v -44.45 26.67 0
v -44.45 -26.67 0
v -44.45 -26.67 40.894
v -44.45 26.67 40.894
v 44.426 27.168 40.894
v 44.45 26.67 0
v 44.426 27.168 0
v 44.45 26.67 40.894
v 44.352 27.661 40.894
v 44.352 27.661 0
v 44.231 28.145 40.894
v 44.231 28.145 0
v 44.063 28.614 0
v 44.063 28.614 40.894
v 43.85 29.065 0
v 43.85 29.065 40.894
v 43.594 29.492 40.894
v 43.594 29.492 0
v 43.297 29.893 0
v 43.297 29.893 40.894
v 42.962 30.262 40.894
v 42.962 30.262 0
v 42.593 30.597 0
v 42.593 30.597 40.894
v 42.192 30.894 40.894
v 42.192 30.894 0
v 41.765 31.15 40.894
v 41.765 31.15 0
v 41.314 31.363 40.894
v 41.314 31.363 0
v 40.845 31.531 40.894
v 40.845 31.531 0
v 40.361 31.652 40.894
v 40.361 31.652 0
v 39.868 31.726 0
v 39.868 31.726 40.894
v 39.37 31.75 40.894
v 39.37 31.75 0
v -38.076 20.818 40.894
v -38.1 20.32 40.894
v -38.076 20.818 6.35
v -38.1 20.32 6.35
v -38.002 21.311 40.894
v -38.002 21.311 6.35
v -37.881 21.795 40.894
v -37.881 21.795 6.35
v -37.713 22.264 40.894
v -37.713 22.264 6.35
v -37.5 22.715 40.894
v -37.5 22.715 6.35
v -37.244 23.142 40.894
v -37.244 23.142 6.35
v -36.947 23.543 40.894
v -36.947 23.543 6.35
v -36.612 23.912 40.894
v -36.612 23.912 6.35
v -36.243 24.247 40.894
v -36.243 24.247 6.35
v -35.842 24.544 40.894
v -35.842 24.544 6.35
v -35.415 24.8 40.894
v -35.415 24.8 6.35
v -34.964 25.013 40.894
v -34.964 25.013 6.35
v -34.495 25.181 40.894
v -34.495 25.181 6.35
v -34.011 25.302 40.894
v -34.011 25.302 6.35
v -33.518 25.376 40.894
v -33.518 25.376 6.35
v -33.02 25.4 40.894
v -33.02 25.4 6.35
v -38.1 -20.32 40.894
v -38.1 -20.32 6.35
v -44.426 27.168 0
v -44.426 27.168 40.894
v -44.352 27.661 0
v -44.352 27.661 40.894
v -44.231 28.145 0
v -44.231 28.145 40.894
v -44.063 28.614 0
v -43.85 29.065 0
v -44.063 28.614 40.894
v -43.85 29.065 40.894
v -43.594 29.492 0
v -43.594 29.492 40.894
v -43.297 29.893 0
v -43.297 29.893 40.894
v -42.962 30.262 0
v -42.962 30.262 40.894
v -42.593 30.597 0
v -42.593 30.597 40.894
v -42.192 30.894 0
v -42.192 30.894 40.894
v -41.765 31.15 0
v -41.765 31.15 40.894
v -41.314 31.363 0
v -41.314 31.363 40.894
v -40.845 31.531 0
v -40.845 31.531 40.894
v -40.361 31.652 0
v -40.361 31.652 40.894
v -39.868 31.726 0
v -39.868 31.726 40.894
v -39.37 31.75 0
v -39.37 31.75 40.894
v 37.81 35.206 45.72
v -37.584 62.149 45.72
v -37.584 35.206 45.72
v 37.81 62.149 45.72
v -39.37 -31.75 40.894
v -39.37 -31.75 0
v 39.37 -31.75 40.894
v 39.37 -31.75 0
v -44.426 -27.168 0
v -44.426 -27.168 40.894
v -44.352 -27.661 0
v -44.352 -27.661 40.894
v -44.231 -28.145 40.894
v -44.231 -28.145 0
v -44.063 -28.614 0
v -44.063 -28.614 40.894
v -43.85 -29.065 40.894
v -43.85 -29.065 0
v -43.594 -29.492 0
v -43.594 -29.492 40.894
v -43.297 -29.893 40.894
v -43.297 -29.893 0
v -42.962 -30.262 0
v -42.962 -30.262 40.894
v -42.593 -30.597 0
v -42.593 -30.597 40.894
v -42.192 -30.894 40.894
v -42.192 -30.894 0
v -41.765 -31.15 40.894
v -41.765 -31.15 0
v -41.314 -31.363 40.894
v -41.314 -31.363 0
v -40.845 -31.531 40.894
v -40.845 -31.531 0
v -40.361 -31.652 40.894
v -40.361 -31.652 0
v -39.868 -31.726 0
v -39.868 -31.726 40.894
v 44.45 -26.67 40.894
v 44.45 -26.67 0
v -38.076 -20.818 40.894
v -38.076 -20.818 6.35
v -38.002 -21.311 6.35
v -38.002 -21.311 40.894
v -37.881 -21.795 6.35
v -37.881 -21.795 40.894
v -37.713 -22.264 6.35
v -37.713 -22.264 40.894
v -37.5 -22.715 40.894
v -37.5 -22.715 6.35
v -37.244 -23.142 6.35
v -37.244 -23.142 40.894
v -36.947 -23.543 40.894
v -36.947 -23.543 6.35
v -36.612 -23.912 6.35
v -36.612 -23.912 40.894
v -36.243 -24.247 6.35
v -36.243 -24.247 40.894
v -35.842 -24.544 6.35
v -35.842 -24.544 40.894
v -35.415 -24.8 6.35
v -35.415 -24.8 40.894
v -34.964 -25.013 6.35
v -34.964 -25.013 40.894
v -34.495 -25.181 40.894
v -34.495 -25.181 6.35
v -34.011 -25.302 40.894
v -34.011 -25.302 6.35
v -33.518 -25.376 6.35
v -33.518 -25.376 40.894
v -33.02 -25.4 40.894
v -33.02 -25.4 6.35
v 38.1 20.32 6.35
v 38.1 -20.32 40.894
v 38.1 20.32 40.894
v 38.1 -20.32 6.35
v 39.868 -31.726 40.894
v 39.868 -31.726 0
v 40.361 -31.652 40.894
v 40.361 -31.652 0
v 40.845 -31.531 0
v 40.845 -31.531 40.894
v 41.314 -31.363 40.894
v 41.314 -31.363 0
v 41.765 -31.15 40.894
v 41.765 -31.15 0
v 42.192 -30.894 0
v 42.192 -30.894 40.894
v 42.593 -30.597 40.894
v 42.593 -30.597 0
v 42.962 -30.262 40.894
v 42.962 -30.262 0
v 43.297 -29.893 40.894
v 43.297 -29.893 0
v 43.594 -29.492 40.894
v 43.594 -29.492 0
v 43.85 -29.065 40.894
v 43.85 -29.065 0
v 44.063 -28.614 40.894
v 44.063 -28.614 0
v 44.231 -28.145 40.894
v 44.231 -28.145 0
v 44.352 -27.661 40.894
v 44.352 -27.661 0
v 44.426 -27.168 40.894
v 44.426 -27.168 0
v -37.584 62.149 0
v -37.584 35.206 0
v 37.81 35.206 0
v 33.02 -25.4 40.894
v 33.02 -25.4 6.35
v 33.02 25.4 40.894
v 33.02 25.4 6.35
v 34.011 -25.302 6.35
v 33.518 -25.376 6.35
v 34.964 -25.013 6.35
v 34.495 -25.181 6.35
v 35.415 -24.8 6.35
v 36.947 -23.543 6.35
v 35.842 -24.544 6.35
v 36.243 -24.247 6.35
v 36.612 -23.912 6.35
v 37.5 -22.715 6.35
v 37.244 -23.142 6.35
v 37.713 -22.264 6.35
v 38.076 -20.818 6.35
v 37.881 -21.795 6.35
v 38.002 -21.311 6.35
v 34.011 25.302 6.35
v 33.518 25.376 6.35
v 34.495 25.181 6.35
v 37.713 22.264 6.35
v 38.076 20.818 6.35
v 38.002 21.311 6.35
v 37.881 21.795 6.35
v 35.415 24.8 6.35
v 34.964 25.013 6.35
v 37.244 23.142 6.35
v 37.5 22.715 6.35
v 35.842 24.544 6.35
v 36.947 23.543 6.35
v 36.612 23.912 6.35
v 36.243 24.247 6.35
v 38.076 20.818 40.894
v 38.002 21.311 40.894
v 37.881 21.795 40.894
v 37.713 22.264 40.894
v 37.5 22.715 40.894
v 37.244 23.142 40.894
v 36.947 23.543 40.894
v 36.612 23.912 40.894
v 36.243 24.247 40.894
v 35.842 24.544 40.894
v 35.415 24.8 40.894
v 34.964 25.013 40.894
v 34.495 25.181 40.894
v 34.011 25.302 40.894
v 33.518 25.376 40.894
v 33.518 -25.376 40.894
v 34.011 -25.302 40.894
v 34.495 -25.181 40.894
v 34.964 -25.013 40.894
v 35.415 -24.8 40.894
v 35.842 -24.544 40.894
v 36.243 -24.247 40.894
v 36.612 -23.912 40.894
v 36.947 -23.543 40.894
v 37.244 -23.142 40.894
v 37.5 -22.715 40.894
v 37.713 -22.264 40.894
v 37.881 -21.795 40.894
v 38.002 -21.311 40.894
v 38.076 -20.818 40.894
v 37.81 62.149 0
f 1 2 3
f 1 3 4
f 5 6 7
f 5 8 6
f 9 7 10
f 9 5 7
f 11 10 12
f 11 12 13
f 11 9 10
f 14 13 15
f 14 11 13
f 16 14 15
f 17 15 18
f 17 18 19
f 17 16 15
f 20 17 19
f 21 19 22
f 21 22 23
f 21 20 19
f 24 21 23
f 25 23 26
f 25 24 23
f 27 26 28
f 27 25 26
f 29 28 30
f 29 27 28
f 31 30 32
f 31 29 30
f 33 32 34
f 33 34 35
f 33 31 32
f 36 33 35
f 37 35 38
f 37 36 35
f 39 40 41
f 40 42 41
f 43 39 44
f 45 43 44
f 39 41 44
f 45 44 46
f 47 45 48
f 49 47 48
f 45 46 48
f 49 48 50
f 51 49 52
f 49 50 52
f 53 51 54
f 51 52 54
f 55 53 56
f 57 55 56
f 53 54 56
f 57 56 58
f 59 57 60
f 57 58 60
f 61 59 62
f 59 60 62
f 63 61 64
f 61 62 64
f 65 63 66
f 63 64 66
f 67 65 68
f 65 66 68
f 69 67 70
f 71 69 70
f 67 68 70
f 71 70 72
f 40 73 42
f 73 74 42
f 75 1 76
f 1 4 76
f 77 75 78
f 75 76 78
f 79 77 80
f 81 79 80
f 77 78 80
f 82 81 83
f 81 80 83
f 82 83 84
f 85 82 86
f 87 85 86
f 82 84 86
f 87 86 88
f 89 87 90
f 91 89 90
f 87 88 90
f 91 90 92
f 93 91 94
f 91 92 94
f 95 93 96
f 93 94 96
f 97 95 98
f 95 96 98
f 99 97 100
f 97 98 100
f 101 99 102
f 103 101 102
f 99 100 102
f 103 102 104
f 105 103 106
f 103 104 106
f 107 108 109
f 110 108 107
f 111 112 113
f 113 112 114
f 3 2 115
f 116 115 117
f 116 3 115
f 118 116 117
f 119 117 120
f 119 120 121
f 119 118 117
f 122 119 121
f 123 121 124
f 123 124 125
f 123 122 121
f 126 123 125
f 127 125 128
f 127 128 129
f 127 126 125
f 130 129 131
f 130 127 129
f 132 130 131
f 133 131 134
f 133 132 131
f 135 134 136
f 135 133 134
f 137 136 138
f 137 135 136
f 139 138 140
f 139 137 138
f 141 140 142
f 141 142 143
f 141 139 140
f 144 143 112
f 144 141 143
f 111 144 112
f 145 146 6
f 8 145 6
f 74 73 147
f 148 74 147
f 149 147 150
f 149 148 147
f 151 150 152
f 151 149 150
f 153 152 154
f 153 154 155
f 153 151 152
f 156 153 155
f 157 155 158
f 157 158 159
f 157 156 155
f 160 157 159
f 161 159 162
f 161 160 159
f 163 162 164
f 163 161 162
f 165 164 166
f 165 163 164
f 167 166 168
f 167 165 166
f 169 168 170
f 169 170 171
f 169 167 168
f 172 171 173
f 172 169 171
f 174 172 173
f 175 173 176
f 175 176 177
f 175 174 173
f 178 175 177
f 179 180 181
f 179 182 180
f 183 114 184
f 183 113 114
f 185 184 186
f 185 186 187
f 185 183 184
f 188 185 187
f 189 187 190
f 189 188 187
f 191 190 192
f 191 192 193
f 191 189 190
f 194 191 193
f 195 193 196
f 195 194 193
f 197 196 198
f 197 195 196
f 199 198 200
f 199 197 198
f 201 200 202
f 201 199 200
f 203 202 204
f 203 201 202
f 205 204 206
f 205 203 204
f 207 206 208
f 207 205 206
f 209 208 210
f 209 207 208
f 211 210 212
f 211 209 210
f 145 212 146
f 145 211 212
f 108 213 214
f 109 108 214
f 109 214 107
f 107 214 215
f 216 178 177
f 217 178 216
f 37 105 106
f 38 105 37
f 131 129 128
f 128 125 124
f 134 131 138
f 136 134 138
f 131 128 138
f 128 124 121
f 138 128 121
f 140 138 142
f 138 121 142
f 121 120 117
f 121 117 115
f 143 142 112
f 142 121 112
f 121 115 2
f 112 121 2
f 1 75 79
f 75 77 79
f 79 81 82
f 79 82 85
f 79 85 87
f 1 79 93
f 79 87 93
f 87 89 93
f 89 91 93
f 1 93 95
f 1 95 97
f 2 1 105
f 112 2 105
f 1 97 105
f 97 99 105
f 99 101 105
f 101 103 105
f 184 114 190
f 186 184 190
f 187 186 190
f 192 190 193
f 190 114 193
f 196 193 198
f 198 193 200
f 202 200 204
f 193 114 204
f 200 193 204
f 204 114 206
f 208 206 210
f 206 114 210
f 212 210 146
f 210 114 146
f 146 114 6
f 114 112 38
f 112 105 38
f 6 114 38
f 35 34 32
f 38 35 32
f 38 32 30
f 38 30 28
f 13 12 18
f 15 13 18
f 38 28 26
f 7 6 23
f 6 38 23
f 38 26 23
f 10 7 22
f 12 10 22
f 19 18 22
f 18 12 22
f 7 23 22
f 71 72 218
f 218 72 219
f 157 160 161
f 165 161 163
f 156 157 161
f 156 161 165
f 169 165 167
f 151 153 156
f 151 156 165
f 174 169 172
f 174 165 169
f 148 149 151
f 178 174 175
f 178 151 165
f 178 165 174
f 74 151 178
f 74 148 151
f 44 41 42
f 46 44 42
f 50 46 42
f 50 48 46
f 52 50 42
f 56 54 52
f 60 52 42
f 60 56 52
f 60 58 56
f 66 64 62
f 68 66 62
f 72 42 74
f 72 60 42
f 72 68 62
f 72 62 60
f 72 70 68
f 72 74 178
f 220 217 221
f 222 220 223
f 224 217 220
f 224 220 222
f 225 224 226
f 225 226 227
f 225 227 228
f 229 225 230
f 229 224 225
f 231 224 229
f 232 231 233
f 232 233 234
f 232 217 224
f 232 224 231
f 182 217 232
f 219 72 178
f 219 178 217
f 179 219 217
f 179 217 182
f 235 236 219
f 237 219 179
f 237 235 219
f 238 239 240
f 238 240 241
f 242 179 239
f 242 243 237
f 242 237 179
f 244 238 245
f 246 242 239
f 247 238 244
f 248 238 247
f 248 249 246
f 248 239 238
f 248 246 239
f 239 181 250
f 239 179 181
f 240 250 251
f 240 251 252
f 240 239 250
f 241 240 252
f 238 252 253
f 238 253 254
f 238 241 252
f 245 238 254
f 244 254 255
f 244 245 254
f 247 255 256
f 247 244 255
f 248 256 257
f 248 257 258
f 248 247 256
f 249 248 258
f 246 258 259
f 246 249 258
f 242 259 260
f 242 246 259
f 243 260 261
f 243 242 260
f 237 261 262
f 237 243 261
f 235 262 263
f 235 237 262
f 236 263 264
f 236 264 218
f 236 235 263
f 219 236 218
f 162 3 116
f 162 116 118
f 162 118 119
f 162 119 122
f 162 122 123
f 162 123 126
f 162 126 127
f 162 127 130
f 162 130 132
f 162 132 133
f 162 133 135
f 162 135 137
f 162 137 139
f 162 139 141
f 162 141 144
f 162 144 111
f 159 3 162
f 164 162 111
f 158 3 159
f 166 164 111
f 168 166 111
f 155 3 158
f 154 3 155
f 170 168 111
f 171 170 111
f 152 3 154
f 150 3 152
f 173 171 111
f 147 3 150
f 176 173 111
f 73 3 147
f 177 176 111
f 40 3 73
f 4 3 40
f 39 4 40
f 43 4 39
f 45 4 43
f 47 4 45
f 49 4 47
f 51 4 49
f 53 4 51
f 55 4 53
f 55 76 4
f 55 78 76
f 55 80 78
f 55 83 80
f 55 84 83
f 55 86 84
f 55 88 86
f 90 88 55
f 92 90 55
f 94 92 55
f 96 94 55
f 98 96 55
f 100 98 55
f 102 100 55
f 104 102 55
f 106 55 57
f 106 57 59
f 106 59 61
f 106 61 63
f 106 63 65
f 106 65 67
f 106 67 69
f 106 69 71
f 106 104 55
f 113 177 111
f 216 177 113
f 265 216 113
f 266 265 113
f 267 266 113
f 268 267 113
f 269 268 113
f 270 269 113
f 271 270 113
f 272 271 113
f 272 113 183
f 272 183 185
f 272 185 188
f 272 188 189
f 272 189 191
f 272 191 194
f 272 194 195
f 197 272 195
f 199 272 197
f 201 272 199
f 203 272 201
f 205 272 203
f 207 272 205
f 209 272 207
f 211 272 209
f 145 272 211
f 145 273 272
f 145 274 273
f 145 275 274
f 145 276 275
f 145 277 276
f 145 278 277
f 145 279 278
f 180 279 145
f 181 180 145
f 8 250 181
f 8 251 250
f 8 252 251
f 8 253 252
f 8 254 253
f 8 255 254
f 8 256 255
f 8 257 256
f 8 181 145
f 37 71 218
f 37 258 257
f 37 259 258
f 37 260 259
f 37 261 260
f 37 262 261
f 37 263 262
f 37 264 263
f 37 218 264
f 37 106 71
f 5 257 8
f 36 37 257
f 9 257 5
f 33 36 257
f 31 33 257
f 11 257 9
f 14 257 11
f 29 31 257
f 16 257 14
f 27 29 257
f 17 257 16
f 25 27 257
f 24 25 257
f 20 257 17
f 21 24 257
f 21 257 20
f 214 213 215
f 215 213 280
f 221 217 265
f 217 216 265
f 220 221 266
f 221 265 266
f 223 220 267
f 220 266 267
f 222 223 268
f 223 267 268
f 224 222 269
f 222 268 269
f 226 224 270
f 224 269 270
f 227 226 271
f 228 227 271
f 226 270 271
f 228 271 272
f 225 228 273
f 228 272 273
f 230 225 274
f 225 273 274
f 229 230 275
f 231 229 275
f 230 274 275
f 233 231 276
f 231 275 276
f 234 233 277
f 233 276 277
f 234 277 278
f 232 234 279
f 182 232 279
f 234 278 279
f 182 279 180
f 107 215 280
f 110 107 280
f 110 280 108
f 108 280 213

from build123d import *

# Parameters (mm, degrees)
F0_W     = 88.9
F0_H     = 63.5
F1_DEPTH = 40.894
F2_T     = -6.35
F3_R     = 5.08
F5_DEPTH = 45.72


with BuildPart() as f1:
    # F0 (on Top) → F1 (new body)
    with BuildSketch(Plane.XY):
        Rectangle(F0_W, F0_H)
    extrude(amount=F1_DEPTH)

    # F2
    f2_openings = [f1.faces().sort_by_distance(p)[0] for p in [
        (0, 0, 40.894),
    ]]
    offset(amount=F2_T, openings=f2_openings)

    # F3
    f3_edges = [f1.edges().sort_by_distance(p)[0] for p in [
        (-44.45, 31.75, 20.447),
        (44.45, 31.75, 20.447),
        (44.45, -31.75, 20.447),
        (-44.45, -31.75, 20.447),
        (-38.1, -25.4, 23.622),
        (38.1, -25.4, 23.622),
        (38.1, 25.4, 23.622),
        (-38.1, 25.4, 23.622),
    ]]
    fillet(f3_edges, radius=F3_R)


with BuildPart() as f5:
    # F4 (on Top) → F5 (new body)
    with BuildSketch(Plane.XY):
        Polygon((-37.5835106074, 62.148632512), (-37.5835106074, 35.2062415301), (0, 35.2062415301), (0.1132027104, 62.148632512), align=None)
        Polygon((0.1132027104, 62.148632512), (0, 35.2062415301), (37.8099160281, 35.2062415301), (37.8099160281, 62.148632512), align=None)
    extrude(amount=F5_DEPTH)


solid = Compound([f1.part, f5.part])
